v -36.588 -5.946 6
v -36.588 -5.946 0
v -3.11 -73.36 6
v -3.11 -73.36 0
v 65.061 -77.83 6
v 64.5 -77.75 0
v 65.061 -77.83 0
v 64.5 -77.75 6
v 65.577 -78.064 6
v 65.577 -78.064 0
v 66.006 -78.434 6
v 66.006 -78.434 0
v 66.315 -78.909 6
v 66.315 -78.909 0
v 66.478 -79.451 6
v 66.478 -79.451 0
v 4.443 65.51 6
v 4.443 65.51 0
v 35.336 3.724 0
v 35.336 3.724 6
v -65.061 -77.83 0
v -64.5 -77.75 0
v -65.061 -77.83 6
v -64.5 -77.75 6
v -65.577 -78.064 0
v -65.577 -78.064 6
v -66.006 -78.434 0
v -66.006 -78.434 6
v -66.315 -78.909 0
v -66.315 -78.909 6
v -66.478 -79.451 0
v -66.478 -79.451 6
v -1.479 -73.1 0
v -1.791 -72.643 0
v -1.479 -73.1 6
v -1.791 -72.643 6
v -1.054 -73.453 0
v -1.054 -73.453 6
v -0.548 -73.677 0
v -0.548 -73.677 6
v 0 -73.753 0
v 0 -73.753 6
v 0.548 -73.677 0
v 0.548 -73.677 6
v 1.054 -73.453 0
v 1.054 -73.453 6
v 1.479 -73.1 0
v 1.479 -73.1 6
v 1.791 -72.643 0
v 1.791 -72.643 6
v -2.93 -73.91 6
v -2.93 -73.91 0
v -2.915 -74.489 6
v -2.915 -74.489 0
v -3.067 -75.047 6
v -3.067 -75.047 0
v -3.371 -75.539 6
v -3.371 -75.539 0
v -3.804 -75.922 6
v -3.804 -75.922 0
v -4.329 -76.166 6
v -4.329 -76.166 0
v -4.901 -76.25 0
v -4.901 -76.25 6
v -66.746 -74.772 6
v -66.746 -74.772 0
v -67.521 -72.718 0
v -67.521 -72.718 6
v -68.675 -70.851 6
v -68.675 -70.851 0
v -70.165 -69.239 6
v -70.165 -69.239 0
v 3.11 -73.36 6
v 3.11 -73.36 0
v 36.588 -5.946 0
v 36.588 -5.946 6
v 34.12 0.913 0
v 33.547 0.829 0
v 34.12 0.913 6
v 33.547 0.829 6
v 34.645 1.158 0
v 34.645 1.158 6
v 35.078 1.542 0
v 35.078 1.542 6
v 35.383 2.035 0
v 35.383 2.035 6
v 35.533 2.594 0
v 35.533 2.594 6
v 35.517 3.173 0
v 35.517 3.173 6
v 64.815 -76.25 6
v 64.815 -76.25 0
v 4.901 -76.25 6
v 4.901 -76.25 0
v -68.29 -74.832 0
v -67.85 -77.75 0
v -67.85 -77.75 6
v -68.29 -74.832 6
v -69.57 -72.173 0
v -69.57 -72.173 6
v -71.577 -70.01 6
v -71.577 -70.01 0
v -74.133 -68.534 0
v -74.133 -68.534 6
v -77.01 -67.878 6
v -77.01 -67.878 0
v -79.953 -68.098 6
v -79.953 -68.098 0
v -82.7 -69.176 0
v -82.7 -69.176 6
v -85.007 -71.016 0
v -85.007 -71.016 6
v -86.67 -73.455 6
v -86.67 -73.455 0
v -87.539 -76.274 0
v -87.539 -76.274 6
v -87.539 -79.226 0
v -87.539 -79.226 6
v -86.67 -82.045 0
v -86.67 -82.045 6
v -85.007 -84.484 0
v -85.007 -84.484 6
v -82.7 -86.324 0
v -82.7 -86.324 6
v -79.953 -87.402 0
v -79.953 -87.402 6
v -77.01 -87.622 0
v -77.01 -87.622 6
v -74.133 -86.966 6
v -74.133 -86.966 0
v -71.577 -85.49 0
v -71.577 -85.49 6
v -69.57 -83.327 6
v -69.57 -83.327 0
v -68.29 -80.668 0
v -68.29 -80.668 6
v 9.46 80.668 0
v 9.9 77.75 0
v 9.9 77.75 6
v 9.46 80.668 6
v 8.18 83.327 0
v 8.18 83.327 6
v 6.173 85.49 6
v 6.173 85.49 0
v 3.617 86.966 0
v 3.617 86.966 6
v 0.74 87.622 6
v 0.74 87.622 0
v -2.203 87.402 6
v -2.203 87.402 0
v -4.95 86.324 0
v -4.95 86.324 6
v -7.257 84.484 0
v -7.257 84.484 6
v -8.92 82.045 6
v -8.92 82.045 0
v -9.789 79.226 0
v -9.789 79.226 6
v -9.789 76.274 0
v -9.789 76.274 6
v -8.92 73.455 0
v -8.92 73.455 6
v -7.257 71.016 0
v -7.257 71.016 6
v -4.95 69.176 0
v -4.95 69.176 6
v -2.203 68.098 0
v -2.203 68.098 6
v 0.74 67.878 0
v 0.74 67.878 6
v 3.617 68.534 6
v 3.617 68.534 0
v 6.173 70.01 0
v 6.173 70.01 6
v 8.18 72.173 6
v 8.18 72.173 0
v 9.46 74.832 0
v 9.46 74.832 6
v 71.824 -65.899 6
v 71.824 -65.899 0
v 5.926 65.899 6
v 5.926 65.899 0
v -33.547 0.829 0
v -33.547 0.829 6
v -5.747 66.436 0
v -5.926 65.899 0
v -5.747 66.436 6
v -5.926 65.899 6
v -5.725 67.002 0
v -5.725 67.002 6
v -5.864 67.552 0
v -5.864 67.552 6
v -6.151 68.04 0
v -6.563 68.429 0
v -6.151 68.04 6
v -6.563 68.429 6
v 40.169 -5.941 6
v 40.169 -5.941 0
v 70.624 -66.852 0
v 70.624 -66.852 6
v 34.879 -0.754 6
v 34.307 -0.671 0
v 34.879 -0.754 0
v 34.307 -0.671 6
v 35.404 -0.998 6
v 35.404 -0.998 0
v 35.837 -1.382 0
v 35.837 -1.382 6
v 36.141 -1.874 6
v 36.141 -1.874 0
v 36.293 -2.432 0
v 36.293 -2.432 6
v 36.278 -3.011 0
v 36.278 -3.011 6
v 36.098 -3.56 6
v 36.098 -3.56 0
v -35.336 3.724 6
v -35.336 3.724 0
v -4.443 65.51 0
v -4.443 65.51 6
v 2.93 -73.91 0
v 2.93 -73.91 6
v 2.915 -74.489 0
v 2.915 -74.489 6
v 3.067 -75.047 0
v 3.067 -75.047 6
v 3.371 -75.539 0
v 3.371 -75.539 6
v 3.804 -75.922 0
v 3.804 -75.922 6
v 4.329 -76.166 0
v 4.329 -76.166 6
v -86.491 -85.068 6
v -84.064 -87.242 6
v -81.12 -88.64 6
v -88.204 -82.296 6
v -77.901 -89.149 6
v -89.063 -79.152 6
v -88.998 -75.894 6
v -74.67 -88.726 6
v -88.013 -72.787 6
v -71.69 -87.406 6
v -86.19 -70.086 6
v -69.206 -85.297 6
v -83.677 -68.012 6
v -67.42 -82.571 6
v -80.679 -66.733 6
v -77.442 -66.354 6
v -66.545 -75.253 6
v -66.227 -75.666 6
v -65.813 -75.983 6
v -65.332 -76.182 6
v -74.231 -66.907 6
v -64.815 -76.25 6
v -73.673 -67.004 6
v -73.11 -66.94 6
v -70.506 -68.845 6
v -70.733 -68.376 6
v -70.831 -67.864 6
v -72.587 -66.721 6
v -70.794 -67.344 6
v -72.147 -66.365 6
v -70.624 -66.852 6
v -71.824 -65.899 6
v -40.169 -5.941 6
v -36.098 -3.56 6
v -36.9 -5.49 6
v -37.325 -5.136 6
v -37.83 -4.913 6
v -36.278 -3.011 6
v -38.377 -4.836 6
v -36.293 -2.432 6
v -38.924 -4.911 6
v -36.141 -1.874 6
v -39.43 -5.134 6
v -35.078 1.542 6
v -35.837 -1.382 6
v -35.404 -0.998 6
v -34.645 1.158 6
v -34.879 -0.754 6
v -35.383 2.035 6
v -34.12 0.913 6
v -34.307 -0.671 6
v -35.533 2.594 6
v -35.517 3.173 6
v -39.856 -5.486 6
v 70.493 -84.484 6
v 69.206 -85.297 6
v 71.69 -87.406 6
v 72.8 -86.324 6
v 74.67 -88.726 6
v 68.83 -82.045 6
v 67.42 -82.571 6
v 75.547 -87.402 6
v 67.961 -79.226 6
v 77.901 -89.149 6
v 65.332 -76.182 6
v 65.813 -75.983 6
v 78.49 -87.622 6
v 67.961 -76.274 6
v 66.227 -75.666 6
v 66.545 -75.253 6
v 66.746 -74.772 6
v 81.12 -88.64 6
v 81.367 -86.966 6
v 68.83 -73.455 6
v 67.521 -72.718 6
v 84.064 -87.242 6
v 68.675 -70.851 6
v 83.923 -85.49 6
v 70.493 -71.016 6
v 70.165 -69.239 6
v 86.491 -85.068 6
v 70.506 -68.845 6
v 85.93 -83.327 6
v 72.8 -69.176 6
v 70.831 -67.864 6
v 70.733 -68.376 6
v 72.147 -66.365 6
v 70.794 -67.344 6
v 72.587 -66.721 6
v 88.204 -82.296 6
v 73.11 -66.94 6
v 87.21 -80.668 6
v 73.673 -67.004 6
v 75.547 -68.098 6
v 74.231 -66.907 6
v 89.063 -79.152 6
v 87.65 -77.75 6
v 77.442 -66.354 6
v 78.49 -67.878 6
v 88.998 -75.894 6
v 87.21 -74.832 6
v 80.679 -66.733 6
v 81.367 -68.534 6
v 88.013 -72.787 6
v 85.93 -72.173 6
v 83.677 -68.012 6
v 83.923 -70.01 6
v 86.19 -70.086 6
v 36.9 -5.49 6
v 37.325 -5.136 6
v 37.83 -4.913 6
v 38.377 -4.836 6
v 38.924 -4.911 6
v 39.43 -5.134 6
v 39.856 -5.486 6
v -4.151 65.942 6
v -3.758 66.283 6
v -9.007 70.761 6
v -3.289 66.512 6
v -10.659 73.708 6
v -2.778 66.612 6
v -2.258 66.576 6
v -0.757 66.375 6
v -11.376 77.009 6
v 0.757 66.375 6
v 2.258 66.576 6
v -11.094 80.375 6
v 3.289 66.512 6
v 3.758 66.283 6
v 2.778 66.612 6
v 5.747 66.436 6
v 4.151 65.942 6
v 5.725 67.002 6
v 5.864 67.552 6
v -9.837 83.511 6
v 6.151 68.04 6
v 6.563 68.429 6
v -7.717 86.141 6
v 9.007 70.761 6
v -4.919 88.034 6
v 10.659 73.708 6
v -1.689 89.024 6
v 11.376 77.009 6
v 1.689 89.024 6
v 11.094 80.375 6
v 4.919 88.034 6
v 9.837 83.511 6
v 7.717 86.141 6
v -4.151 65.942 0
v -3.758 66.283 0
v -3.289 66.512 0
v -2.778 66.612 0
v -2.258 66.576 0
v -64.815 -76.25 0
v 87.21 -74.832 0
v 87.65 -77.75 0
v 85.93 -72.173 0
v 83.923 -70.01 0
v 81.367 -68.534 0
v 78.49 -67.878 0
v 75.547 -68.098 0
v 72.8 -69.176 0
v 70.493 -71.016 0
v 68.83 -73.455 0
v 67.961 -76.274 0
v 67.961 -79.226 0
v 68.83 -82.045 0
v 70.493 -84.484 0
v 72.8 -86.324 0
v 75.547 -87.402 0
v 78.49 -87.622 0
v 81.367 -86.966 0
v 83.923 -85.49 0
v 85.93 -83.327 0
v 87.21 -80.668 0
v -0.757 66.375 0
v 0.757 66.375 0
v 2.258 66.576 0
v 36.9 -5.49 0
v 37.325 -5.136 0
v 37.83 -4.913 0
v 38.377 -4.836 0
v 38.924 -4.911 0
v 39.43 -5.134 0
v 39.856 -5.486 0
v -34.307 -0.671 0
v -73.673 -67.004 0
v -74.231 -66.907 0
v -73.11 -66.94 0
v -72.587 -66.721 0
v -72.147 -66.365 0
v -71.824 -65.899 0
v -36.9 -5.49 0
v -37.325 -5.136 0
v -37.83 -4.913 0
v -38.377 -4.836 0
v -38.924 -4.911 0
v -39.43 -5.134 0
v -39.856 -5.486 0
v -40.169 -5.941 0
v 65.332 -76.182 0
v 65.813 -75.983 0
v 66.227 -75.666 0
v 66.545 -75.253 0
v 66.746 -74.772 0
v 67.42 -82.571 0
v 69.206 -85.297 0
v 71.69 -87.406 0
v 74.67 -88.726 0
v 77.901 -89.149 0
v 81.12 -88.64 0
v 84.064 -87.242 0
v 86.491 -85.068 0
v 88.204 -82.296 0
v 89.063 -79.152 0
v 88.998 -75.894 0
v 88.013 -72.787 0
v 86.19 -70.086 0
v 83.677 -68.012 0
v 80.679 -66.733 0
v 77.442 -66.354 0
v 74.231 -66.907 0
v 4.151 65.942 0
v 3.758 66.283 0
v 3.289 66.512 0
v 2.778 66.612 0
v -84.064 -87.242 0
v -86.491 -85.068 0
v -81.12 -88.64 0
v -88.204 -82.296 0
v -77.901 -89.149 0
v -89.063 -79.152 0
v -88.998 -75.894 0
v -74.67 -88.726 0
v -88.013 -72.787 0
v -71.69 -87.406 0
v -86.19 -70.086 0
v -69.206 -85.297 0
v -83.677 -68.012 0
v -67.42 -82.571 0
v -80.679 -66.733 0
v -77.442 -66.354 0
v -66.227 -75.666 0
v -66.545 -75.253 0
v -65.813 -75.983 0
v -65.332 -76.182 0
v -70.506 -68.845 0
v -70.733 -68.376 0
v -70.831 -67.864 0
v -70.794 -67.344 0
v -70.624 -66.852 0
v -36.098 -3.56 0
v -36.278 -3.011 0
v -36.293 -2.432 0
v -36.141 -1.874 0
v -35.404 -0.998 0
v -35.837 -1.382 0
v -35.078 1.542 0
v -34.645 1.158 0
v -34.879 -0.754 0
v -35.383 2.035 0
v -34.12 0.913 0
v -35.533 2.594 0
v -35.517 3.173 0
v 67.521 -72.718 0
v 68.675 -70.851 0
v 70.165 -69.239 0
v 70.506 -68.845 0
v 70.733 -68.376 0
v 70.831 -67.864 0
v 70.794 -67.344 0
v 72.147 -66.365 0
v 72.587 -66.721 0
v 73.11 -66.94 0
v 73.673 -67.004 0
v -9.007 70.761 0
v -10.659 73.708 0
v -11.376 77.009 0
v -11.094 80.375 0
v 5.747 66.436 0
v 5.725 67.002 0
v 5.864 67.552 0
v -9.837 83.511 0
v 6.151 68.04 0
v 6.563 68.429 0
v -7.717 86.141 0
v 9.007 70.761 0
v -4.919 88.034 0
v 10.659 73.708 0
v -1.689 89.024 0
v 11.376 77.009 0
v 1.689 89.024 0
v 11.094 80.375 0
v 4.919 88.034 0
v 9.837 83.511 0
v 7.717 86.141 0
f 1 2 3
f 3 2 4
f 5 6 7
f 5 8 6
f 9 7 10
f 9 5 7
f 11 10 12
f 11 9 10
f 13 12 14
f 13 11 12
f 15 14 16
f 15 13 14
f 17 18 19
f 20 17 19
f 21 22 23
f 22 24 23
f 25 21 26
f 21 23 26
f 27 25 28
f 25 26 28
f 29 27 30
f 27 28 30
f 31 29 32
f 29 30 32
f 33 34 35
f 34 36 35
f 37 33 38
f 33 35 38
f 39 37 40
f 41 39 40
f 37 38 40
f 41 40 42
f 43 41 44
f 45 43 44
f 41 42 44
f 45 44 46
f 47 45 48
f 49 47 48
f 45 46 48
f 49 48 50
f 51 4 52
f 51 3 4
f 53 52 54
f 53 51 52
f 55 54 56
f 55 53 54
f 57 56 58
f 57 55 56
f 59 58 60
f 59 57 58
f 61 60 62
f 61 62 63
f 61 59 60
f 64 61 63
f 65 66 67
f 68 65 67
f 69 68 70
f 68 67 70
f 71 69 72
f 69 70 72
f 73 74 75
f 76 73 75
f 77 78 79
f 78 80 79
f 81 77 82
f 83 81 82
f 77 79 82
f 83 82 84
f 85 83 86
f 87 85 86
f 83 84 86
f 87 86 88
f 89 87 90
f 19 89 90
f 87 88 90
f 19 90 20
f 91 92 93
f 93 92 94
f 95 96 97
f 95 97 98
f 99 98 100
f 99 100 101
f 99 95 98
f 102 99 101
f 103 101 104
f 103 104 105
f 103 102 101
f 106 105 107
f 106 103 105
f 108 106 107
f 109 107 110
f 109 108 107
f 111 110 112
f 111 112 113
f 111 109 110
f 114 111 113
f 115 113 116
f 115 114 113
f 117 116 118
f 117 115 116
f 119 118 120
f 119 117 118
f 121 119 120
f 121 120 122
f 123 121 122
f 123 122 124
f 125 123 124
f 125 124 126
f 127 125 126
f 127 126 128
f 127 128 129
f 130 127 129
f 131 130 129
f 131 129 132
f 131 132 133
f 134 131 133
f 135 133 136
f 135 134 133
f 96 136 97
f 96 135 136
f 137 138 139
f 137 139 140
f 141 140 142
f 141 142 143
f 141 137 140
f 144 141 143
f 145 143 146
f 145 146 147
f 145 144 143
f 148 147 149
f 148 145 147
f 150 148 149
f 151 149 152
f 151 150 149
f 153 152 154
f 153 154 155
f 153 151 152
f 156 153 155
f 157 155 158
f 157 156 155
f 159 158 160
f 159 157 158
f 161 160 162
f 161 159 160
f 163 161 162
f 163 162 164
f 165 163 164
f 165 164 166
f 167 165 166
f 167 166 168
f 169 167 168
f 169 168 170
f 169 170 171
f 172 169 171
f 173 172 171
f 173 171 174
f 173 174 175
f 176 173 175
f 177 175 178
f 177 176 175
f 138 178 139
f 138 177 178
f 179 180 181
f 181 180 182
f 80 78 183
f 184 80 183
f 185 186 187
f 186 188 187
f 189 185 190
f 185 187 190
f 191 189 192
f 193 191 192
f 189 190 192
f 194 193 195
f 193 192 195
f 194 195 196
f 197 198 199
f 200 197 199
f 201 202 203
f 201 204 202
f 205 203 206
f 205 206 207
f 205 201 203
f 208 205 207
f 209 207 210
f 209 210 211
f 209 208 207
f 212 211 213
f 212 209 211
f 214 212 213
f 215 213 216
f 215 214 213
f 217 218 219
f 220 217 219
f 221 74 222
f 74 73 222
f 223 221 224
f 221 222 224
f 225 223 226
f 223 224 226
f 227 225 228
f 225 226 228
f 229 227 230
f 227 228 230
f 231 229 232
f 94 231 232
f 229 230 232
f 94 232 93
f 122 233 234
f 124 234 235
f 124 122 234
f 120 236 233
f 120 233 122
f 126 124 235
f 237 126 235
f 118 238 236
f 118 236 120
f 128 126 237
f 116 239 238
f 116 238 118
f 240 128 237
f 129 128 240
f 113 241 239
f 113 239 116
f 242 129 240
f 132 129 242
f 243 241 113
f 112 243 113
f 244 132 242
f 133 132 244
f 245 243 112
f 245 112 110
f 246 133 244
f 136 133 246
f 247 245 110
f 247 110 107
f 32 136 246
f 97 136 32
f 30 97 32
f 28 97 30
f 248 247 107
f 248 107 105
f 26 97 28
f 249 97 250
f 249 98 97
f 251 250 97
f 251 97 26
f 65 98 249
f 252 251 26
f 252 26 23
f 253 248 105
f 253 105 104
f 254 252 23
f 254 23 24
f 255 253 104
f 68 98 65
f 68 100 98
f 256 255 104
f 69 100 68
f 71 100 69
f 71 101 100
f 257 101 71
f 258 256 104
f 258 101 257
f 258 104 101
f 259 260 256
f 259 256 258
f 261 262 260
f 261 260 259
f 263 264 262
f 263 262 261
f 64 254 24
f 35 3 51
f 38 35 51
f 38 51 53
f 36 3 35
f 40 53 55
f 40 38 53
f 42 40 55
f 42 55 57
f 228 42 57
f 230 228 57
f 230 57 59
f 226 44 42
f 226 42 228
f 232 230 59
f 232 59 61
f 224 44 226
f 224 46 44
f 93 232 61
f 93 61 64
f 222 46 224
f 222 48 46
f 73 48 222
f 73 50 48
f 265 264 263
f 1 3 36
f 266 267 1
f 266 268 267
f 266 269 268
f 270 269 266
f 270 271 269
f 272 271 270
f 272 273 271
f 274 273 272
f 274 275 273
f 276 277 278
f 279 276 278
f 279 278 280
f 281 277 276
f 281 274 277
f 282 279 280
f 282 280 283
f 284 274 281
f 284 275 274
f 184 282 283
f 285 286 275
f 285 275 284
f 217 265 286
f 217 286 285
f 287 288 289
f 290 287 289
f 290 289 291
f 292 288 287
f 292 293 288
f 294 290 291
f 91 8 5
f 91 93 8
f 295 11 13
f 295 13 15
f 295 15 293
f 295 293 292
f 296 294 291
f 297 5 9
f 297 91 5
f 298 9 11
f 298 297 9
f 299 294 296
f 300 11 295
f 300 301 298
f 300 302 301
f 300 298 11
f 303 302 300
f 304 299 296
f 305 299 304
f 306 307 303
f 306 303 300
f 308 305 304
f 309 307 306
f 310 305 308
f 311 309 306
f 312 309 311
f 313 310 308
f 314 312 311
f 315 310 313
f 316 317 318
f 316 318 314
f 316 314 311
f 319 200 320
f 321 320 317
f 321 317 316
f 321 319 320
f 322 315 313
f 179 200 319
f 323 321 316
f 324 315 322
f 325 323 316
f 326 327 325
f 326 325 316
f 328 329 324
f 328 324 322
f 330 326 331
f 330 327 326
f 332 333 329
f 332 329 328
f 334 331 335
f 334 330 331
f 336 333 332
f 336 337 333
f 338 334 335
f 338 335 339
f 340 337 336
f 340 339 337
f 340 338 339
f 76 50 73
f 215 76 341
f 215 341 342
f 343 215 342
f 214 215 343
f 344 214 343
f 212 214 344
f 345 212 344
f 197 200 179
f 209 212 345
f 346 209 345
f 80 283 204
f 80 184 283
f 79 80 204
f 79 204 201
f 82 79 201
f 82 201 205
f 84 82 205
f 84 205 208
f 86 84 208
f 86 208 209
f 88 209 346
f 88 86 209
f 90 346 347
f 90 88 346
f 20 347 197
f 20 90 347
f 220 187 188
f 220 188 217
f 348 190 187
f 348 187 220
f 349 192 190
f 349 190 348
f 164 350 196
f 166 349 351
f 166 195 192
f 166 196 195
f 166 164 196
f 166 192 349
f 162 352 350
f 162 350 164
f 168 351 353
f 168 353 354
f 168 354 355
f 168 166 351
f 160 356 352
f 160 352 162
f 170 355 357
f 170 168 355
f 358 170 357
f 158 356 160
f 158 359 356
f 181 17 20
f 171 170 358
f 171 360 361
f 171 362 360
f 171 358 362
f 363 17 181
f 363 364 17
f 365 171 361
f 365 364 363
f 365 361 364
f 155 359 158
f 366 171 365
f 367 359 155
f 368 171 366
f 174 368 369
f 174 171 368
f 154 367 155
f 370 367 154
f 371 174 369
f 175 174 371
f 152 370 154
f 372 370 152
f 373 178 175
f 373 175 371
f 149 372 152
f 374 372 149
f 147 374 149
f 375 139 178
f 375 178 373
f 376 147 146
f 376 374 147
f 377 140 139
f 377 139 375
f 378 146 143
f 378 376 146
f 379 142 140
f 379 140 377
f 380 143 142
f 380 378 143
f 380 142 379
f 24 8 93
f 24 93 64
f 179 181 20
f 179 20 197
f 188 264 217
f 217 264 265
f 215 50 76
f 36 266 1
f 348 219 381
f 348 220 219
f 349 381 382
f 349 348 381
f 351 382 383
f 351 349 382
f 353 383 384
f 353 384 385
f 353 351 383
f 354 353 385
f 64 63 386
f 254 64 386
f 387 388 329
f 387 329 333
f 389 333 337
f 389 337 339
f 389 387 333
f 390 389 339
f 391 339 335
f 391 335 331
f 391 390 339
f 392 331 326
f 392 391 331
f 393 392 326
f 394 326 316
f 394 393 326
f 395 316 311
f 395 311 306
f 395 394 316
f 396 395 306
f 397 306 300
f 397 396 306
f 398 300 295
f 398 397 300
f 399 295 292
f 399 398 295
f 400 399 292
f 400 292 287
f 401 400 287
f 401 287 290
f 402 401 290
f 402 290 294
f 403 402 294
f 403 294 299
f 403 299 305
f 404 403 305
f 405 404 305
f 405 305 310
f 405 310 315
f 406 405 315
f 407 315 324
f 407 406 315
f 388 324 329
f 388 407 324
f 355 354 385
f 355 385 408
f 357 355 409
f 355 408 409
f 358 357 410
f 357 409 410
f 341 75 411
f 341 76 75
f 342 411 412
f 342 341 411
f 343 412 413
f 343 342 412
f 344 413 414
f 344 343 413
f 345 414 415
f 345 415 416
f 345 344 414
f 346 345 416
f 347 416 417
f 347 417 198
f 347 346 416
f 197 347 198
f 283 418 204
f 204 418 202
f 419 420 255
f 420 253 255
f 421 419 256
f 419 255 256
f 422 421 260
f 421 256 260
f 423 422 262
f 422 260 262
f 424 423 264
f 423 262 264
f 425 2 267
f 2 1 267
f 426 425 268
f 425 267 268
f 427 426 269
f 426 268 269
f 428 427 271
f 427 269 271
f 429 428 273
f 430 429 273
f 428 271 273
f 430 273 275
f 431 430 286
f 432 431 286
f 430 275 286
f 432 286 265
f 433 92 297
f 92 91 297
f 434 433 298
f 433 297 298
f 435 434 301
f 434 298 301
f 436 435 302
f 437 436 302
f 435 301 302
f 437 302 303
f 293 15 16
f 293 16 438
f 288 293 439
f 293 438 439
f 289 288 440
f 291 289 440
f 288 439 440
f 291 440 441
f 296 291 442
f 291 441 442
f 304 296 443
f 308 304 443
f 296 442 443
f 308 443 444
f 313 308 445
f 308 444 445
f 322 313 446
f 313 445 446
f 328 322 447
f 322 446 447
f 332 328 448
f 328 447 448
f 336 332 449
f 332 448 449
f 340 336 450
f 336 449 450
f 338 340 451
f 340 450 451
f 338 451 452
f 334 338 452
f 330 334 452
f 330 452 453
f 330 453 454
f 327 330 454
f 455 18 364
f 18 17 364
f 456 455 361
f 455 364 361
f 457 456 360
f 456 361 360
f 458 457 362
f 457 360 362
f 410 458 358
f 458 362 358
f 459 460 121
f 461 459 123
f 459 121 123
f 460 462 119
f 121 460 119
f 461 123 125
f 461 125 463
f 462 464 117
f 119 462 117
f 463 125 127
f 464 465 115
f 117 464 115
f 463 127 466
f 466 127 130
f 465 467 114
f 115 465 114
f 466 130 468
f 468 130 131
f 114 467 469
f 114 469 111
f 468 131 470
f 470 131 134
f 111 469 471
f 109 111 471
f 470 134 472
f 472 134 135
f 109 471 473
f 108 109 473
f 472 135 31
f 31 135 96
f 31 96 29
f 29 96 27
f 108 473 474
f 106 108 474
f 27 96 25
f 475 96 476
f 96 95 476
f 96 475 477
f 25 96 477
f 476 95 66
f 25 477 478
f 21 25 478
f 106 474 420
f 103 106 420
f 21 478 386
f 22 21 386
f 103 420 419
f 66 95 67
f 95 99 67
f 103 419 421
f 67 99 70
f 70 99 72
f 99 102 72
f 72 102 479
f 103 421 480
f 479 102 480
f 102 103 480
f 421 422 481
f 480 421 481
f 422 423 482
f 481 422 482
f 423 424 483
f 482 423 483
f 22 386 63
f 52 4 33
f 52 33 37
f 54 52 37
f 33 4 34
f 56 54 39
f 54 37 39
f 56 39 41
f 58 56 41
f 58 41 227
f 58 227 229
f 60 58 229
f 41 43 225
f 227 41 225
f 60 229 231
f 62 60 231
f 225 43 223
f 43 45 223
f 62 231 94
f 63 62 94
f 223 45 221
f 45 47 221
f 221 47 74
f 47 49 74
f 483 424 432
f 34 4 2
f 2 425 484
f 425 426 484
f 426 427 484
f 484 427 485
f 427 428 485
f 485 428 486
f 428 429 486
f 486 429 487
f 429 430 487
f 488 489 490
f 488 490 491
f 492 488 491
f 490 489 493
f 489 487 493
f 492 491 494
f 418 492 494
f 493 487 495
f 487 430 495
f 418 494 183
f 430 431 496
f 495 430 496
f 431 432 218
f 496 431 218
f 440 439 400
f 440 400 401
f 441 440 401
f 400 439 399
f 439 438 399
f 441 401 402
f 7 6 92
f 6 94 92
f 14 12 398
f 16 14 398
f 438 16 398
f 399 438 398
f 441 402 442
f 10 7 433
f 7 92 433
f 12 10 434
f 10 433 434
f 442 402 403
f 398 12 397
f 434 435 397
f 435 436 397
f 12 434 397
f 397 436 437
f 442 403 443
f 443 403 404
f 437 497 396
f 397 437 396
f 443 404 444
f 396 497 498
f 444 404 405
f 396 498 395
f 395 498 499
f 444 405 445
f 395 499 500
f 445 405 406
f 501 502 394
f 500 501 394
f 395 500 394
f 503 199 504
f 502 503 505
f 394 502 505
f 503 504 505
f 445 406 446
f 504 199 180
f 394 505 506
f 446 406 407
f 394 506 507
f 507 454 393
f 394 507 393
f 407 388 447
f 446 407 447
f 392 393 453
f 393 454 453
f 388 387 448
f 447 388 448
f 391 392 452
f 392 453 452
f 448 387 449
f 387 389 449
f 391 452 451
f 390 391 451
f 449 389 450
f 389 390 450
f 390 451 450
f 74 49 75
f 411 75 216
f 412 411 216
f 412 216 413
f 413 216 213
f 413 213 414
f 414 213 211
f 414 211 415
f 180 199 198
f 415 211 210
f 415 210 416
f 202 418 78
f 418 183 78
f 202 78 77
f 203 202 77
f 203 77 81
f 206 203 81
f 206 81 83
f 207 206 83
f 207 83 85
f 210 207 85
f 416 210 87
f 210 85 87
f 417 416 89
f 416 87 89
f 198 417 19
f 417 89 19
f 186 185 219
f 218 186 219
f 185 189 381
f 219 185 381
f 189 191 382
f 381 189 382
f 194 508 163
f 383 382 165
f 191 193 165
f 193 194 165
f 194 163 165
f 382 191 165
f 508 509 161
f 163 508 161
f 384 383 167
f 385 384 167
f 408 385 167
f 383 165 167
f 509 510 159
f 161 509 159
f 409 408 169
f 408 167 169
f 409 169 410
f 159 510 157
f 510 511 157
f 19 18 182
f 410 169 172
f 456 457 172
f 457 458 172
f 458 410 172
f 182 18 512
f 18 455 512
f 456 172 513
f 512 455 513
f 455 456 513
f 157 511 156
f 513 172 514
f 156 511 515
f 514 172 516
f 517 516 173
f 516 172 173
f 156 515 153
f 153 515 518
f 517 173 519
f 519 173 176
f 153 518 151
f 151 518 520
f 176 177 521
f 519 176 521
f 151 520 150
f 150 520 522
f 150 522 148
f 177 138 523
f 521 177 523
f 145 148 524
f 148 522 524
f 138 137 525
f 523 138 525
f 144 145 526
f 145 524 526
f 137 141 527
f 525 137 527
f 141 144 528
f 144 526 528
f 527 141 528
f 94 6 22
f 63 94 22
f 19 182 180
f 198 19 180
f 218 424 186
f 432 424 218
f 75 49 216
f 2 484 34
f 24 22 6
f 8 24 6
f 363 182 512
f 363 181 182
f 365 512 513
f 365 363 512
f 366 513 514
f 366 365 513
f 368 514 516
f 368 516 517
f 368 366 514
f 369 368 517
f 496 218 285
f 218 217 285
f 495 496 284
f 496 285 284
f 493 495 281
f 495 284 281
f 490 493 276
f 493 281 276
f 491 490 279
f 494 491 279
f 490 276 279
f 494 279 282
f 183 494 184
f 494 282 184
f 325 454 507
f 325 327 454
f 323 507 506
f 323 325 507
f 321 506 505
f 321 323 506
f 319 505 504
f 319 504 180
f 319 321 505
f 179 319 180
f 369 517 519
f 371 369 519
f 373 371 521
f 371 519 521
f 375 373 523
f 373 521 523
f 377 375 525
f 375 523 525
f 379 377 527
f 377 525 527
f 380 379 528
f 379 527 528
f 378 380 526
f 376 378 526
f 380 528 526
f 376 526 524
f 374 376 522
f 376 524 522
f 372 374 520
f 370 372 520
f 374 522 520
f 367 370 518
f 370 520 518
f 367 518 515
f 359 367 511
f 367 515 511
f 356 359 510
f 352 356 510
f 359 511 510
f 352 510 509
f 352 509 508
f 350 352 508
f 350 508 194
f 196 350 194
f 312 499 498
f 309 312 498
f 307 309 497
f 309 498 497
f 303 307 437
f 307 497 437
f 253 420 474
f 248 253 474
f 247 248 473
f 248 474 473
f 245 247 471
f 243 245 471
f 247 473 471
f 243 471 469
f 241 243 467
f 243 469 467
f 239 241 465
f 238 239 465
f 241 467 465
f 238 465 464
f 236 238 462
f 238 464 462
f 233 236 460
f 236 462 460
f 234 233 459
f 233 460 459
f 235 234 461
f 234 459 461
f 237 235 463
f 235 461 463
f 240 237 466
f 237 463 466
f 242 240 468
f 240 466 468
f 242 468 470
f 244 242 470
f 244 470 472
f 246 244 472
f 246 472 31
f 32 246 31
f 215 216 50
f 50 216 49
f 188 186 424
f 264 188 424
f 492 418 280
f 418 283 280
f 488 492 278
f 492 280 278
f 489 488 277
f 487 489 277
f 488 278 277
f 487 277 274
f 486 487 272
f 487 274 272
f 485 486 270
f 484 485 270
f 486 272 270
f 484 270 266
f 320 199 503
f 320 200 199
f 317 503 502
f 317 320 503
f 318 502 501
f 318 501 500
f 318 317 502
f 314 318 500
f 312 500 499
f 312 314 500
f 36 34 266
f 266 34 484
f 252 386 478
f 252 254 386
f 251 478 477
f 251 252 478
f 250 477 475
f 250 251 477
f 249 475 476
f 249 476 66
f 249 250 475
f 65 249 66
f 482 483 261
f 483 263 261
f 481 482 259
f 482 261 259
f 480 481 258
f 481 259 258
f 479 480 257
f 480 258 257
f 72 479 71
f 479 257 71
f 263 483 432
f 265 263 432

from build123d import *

# Parameters (mm, degrees)
F0_R     = 9.9
F1_DEPTH = 6
F2_R     = 2


with BuildPart() as f1:
    # F0 (on Top) → F1 (new body)
    with BuildSketch(Plane.XY):
        with BuildLine():
            Line((-66.35, -77.75), (66.35, -77.75))
            ThreePointArc((66.35, -77.75), (87.447419, -83.743335), (72.651765, -67.55353))
            Line((72.651765, -67.55353), (5.098235, 67.55353))
            ThreePointArc((5.098235, 67.55353), (0, 89.15), (-5.098235, 67.55353))
            Line((-5.098235, 67.55353), (-72.651765, -67.55353))
            ThreePointArc((-72.651765, -67.55353), (-87.447419, -83.743335), (-66.35, -77.75))
        make_face()
        with Locations((-77.75, -77.75)):
            Circle(F0_R, mode=Mode.SUBTRACT)
        with BuildLine():
            Line((-1.674783, -76.25), (-66.449115, -76.25))
            ThreePointArc((-66.449115, -76.25), (-68.052581, -71.756665), (-71.35445, -68.313002))
            Line((-71.35445, -68.313002), (-38.373599, -2.351301))
            Line((-38.373599, -2.351301), (-1.674783, -76.25))
        make_face(mode=Mode.SUBTRACT)
        with Locations((77.75, -77.75)):
            Circle(F0_R, mode=Mode.SUBTRACT)
        Polygon((37.533359, -0.67082), (0, -76.25), (-37.533359, -0.67082), align=None, mode=Mode.SUBTRACT)
        with BuildLine():
            Line((38.373599, -2.351301), (71.35445, -68.313002))
            ThreePointArc((71.35445, -68.313002), (68.052581, -71.756665), (66.449115, -76.25))
            Line((66.449115, -76.25), (1.674783, -76.25))
            Line((1.674783, -76.25), (38.373599, -2.351301))
        make_face(mode=Mode.SUBTRACT)
        with Locations((0, 77.75)):
            Circle(F0_R, mode=Mode.SUBTRACT)
        with BuildLine():
            ThreePointArc((-3.712269, 66.971361), (0, 66.35), (3.712269, 66.971361))
            Line((3.712269, 66.971361), (36.783359, 0.82918))
            Line((36.783359, 0.82918), (-36.783359, 0.82918))
            Line((-36.783359, 0.82918), (-3.712269, 66.971361))
        make_face(mode=Mode.SUBTRACT)
    extrude(amount=F1_DEPTH)

    # F2
    f2_edges = [f1.edges().sort_by_distance(p)[0] for p in [
        (-37.533359, -0.67082, 3),
        (-3.712269, 66.971361, 3),
        (5.098235, 67.55353, 3),
        (3.712269, 66.971361, 3),
        (-5.098235, 67.55353, 3),
        (38.373599, -2.351301, 3),
        (37.533359, -0.67082, 3),
        (36.783359, 0.82918, 3),
        (1.674783, -76.25, 3),
        (0, -76.25, 3),
        (-1.674783, -76.25, 3),
        (71.35445, -68.313002, 3),
        (66.449115, -76.25, 3),
        (66.35, -77.75, 3),
        (72.651765, -67.55353, 3),
        (-66.35, -77.75, 3),
        (-72.651765, -67.55353, 3),
        (-66.449115, -76.25, 3),
        (-71.35445, -68.313002, 3),
        (-36.783359, 0.82918, 3),
        (-38.373599, -2.351301, 3),
    ]]
    fillet(f2_edges, radius=F2_R)


solid = f1.part
